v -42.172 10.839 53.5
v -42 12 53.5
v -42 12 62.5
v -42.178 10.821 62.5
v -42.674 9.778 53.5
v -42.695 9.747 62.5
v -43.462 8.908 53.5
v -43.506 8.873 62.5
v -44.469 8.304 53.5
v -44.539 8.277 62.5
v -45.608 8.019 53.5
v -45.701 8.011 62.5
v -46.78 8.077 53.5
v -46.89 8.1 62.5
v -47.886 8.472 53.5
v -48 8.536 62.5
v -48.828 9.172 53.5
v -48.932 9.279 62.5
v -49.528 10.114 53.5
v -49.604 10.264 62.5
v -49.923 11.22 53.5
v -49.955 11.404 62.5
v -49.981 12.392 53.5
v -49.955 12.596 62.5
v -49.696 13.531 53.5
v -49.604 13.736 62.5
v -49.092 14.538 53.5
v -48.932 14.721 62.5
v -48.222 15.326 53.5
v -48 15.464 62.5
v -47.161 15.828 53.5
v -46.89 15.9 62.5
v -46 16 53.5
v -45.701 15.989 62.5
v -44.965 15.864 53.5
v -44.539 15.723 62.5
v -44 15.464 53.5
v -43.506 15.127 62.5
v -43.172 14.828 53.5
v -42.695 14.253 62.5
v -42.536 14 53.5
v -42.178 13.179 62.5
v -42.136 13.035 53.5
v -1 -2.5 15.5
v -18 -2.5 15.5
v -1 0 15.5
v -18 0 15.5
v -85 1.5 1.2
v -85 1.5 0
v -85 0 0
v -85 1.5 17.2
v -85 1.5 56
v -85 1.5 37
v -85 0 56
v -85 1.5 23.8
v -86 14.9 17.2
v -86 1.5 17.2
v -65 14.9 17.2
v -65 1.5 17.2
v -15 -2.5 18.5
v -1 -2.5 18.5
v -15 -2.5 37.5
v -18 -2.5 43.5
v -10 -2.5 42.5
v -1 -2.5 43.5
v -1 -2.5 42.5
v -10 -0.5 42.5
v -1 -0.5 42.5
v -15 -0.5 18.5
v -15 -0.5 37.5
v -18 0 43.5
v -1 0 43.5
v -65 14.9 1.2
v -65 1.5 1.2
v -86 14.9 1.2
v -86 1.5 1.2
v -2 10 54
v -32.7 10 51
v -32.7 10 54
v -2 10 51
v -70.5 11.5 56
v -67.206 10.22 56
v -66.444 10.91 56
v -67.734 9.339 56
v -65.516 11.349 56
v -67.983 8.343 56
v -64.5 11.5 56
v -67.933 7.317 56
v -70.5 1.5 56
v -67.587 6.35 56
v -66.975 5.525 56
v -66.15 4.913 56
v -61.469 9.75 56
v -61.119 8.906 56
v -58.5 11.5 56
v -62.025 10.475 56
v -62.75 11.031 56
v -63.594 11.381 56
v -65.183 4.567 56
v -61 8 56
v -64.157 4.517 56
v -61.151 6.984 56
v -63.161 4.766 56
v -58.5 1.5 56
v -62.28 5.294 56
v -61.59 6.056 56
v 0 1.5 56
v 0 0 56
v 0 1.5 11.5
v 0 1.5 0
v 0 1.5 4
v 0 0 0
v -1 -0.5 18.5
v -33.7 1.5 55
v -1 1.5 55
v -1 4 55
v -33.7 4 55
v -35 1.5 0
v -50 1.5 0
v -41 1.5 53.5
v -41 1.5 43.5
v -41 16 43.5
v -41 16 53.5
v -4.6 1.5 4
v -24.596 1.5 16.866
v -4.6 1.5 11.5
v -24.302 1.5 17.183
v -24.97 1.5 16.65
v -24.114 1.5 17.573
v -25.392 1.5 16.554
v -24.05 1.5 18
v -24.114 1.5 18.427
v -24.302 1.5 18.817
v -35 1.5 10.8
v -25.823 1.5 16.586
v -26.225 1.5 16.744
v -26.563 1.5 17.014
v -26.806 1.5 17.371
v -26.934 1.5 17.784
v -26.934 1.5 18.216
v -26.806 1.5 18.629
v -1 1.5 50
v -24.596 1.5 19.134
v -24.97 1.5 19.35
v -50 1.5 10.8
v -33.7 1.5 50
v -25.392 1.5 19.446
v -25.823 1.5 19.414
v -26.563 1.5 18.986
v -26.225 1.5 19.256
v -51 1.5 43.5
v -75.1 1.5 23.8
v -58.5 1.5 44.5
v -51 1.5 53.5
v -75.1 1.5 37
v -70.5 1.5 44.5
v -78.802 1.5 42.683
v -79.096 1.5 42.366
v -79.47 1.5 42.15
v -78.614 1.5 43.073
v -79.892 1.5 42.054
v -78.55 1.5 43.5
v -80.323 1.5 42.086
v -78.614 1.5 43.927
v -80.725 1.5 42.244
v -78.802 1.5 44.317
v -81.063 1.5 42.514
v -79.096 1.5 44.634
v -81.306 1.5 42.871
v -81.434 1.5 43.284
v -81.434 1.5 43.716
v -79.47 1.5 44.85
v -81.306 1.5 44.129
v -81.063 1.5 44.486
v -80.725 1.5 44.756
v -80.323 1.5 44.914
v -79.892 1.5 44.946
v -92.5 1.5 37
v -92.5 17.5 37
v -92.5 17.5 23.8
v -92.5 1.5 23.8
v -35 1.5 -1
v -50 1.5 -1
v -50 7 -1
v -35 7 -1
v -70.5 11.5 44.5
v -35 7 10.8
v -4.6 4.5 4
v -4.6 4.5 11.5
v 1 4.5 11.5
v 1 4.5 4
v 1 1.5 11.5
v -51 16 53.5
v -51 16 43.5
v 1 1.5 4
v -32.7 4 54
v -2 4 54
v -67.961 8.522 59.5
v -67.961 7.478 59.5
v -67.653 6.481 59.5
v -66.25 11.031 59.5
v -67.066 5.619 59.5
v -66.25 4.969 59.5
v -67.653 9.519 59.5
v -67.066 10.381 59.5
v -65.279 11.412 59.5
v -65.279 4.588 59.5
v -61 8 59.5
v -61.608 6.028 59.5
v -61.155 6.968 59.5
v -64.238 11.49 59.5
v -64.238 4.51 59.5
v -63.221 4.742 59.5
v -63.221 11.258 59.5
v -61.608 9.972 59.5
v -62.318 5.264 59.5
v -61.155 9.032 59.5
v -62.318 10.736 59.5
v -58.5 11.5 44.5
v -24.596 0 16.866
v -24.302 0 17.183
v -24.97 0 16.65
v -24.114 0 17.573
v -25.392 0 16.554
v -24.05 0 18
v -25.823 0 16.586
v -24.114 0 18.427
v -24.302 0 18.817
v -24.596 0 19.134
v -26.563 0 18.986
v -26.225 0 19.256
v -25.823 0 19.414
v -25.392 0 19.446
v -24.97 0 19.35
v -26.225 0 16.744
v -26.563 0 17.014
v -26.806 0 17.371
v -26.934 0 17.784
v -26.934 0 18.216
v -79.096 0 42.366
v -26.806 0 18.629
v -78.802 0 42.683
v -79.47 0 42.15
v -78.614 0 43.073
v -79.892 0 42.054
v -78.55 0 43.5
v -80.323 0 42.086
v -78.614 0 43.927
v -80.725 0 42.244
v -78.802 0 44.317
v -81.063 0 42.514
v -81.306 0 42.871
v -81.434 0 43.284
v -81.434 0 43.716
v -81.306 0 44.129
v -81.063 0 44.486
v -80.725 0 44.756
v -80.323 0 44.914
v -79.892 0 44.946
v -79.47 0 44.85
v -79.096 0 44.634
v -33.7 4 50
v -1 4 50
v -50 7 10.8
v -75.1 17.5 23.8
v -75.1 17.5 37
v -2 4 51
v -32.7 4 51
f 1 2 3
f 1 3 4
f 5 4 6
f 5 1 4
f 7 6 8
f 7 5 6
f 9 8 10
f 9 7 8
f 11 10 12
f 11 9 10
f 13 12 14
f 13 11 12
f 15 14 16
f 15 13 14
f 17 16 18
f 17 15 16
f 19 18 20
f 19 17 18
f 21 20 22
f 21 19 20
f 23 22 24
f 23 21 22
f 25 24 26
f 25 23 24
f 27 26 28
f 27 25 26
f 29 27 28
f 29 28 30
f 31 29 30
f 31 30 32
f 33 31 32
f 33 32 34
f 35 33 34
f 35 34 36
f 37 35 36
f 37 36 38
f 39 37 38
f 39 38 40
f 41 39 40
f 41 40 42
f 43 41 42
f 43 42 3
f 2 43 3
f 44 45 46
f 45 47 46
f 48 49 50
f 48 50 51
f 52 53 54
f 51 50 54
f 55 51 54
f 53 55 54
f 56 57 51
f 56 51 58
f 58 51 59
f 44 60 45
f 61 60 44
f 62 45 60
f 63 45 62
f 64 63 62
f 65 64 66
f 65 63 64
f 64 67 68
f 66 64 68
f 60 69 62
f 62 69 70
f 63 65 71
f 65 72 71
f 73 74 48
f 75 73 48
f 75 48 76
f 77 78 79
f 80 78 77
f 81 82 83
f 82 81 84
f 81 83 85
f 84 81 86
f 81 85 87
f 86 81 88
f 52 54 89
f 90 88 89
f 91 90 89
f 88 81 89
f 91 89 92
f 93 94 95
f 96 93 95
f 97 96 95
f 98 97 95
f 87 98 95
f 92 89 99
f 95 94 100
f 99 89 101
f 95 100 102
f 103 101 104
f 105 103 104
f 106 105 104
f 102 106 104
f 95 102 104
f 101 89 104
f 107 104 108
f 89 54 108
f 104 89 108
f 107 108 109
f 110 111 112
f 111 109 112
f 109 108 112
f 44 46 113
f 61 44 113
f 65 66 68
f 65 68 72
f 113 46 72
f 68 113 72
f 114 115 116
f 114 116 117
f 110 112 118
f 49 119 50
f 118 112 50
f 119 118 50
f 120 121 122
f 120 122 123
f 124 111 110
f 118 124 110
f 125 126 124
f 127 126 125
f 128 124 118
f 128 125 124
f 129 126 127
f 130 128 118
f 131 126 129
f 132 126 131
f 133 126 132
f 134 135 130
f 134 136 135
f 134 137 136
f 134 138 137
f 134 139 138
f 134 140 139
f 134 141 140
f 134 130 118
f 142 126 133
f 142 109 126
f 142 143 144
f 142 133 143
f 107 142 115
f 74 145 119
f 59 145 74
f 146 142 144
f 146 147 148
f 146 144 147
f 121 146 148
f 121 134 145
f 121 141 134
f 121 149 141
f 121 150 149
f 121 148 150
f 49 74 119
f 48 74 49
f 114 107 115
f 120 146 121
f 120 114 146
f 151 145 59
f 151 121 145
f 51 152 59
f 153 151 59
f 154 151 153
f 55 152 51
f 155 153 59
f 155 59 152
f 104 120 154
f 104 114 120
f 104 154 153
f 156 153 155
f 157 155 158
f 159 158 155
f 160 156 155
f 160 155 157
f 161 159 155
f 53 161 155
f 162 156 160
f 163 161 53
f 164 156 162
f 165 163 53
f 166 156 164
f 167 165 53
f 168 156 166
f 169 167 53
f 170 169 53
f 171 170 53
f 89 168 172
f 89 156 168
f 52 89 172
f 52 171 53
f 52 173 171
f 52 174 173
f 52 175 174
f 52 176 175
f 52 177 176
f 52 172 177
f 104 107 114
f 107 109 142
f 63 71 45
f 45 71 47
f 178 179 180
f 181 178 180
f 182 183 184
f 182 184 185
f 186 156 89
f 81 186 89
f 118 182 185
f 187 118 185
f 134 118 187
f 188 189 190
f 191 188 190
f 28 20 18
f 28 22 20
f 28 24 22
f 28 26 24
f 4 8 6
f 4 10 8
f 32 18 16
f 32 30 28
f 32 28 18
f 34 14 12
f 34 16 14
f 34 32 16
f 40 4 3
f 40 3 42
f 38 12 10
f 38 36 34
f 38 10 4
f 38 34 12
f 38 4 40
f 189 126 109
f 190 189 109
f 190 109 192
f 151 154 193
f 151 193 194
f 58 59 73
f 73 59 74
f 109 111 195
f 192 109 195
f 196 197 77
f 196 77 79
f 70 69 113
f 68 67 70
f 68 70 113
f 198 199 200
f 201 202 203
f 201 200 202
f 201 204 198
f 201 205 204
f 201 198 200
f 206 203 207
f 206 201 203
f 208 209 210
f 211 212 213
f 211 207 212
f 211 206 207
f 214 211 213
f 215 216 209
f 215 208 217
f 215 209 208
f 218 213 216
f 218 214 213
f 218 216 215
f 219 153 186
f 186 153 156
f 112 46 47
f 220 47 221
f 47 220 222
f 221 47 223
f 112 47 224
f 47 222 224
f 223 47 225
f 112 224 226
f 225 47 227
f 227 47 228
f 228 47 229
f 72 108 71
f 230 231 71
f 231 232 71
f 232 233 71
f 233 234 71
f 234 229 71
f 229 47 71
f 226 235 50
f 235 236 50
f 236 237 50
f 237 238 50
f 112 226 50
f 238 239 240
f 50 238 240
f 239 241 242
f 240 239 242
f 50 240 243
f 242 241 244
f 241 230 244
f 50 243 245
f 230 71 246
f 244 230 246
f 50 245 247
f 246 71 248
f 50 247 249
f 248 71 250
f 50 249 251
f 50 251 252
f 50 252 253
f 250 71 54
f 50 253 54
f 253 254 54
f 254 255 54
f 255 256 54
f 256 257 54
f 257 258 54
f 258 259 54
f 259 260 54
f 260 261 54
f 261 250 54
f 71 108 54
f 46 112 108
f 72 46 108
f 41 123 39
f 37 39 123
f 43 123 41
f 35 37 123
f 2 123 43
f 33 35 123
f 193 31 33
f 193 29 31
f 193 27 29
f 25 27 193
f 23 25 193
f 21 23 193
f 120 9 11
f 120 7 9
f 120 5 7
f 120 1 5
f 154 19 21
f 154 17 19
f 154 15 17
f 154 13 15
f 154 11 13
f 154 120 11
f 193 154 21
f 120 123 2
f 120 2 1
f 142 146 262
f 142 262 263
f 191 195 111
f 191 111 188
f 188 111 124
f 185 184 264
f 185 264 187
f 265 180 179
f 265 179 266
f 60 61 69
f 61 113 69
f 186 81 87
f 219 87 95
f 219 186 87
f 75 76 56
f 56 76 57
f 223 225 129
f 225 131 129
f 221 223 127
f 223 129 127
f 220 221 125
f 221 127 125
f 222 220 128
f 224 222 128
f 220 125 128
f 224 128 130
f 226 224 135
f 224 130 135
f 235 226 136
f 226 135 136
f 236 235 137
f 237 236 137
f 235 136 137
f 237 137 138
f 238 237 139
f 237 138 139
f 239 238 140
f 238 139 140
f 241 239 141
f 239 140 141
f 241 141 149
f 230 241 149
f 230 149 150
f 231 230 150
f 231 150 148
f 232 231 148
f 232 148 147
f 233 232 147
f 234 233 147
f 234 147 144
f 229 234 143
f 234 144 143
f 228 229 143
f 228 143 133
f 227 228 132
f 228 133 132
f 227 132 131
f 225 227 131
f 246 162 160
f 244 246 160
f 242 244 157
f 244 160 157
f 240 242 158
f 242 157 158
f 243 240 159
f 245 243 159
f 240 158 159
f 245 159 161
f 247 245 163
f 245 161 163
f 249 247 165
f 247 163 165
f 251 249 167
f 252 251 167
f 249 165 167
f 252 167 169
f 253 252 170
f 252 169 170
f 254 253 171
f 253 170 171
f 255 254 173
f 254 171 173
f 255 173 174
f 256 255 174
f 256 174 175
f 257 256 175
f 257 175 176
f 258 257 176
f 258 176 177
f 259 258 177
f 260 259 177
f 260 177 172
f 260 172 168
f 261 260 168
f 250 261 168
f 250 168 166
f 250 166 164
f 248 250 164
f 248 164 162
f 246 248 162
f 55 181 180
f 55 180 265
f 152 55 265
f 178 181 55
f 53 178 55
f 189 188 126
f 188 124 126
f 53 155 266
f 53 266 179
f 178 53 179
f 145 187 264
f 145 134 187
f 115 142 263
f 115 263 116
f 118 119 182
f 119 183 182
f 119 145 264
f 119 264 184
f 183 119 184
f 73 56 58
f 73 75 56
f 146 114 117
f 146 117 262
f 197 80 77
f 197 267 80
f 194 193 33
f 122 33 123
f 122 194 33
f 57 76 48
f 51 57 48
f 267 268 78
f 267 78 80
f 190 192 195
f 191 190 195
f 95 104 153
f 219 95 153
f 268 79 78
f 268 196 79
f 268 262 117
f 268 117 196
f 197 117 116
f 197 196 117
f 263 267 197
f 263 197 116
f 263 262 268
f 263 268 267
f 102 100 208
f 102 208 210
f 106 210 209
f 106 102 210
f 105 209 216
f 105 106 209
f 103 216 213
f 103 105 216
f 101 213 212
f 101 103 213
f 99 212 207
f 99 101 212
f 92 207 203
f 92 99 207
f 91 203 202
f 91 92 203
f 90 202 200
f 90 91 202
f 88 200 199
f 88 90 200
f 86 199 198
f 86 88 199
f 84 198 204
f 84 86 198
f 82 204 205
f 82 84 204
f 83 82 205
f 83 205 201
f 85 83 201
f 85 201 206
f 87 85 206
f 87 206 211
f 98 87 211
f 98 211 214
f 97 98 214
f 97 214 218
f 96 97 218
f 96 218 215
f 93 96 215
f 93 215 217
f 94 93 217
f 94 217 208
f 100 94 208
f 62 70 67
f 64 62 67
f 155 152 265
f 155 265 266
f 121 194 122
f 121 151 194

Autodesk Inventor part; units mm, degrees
ref_plane "YZ Plane" through (0, 0, 0) normal (1, 0, 0) x (0, 1, 0)
ref_plane "XZ Plane" through (0, 0, 0) normal (0, 1, 0) x (-1, 0, 0)
ref_plane "XY Plane" through (0, 0, 0) normal (0, 0, 1) x (1, 0, 0)
sketch "Skizze1" plane through (0, 0, 0) normal (0, 1, 0) x (-1, 0, 0)
  line L0 (0, 0) -> (85, 0)
  line L1 (85, 0) -> (85, 56)
  line L2 (85, 56) -> (0, 56)
  line L3 (0, 56) -> (0, 0)
  dimension "d0" = 85
  dimension "d1" = 56
extrude "Extrusion1" add sketch "Skizze1" along normal blind 1.5
sketch "Skizze2" plane through (0, 1.5, 0) normal (0, 1, 0) x (1, 0, 0)
  line L0 (0, 0) -> (-85, 0) projected
  line L1 (-86, -17.2) -> (-65, -17.2)
  line L2 (-65, -17.2) -> (-65, -1.2)
  line L3 (-65, -1.2) -> (-86, -1.2)
  line L4 (-86, -1.2) -> (-86, -17.2)
  line L5 (-85, 0) -> (-85, -56) projected
  dimension "d4" = 21
  dimension "d5" = 16
  dimension "d6" = 1.2
  dimension "d84" = 1
extrude "Extrusion2" add sketch "Skizze2" along normal blind 13.4
sketch "Skizze3" plane through (0, 1.5, 0) normal (0, 1, 0) x (1, 0, 0)
  line L0 (-65, -17.2) -> (-85, -17.2) projected
  line L1 (-85, -17.2) -> (-85, -56) projected
  line L2 (-92.5, -23.8) -> (-75.1, -23.8)
  line L3 (-75.1, -23.8) -> (-75.1, -37)
  line L4 (-75.1, -37) -> (-92.5, -37)
  line L5 (-92.5, -37) -> (-92.5, -23.8)
  dimension "d9" = 7.5
  dimension "d10" = 17.4
  dimension "d11" = 13.2
  dimension "d12" = 6.6
extrude "Extrusion3" add sketch "Skizze3" along normal blind 16
sketch "Skizze4" plane through (0, 1.5, 0) normal (0, 1, 0) x (1, 0, 0)
  line L0 (0, 0) -> (-85, 0) projected
  line L1 (-65, -1.2) -> (-65, -17.2) projected
  line L2 (-50, 1) -> (-35, 1)
  line L3 (-35, 1) -> (-35, -10.8)
  line L4 (-35, -10.8) -> (-50, -10.8)
  line L5 (-50, -10.8) -> (-50, 1)
  dimension "d15" = 1
  dimension "d16" = 15
  dimension "d17" = 11.8
  dimension "d18" = 15
extrude "Extrusion4" add sketch "Skizze4" along normal blind 5.5
sketch "Skizze5" plane through (0, 1.5, 0) normal (0, 1, 0) x (1, 0, 0)
  line L0 (-85, -37) -> (-85, -56) projected
  line L1 (-85, -56) -> (0, -56) projected
  line L2 (-58.5, -44.5) -> (-70.5, -44.5)
  line L3 (-70.5, -44.5) -> (-70.5, -56)
  line L4 (-70.5, -56) -> (-58.5, -56)
  line L5 (-58.5, -56) -> (-58.5, -44.5)
  line L6 (-70.5, -56) -> (-58.5, -56)
  dimension "d21" = 11.5
  dimension "d22" = 12
  dimension "d23" = 14.5
extrude "Extrusion5" add sketch "Skizze5" along normal blind 10
sketch "Skizze6" plane through (-85, 0, 56) normal (0, 0, 1) x (1, 0, 0)
  line L0 (14.5, 11.5) -> (26.5, 11.5) projected
  circle A0 centre (20.5, 8) radius 3.5
  dimension "d26" = 7
  dimension "d27" = 3.5
extrude "Extrusion6" add sketch "Skizze6" along normal blind 3.5
sketch "Skizze7" plane through (0, 1.5, 0) normal (0, 1, 0) x (1, 0, 0)
  line L0 (-58.5, -44.5) -> (-58.5, -56) projected
  line L1 (-58.5, -56) -> (0, -56) projected
  line L2 (-51, -43.5) -> (-41, -43.5)
  line L3 (-41, -43.5) -> (-41, -53.5)
  line L4 (-41, -53.5) -> (-51, -53.5)
  line L5 (-51, -53.5) -> (-51, -43.5)
  dimension "d30" = 10
  dimension "d31" = 10
  dimension "d32" = 2.5
  dimension "d33" = 7.5
extrude "Extrusion7" add sketch "Skizze7" along normal blind 14.5
sketch "Skizze8" plane through (-51, 1.5, 53.5) normal (0, 0, 1) x (1, 0, 0)
  line L0 (0, 14.5) -> (10, 14.5) projected
  circle A0 centre (5, 10.5) radius 4
  point P0 (51, -1.5)
  dimension "d36" = 8
  dimension "d37" = 0
extrude "Extrusion8" add sketch "Skizze8" along normal blind 9
sketch "Skizze9" plane through (0, 1.5, 0) normal (0, 1, 0) x (1, 0, 0)
  line L0 (-58.5, -56) -> (0, -56) projected
  line L1 (0, -56) -> (0, 0) projected
  line L2 (-1, -55) -> (-33.7, -55)
  line L3 (-33.7, -55) -> (-33.7, -50)
  line L4 (-33.7, -50) -> (-1, -50)
  line L5 (-1, -50) -> (-1, -55)
  dimension "d40" = 32.7
  dimension "d41" = 5
  dimension "d42" = 1
  dimension "d43" = 1
extrude "Extrusion9" add sketch "Skizze9" along normal blind 2.5
sketch "Skizze10" plane through (0, 4, 0) normal (0, 1, 0) x (1, 0, 0)
  line L0 (-33.7, -55) -> (-1, -55) projected
  line L1 (-1, -55) -> (-1, -50) projected
  line L2 (-1, -50) -> (-33.7, -50) projected
  line L3 (-33.7, -50) -> (-33.7, -55) projected
  line L4 (-32.7, -51) -> (-2, -51)
  line L5 (-2, -51) -> (-2, -54)
  line L6 (-2, -54) -> (-32.7, -54)
  line L7 (-32.7, -54) -> (-32.7, -51)
  point P0 (0, 0)
  dimension "d50" = 1
  dimension "d51" = 1
  dimension "d52" = 1
  dimension "d53" = 1
extrude "Extrusion10" add sketch "Skizze10" along normal blind 6 contours L4 L5 L6 L7
sketch "Skizze11" plane through (0, 1.5, 0) normal (0, 1, 0) x (1, 0, 0)
  line L0 (0, -56) -> (0, 0) projected
  line L1 (0, 0) -> (-35, 0) projected
  line L2 (1, -4) -> (-4.6, -4)
  line L3 (-4.6, -4) -> (-4.6, -11.5)
  line L4 (-4.6, -11.5) -> (1, -11.5)
  line L5 (1, -11.5) -> (1, -4)
  dimension "d56" = 1
  dimension "d57" = 7.5
  dimension "d58" = 5.6
  dimension "d59" = 4
extrude "Extrusion11" add sketch "Skizze11" along normal blind 3
sketch "Skizze12" plane through (0, 0, 0) normal (0, -1, 0) x (1, 0, 0)
  line L0 (0, 0) -> (-85, 0) projected
  line L1 (0, 56) -> (0, 0) projected
  line L2 (-1, 43.5) -> (-18, 43.5)
  line L3 (-18, 43.5) -> (-18, 15.5)
  line L4 (-18, 15.5) -> (-1, 15.5)
  line L5 (-1, 15.5) -> (-1, 43.5)
  dimension "d62" = 15.5
  dimension "d63" = 17
  dimension "d64" = 28
  dimension "d65" = 1
extrude "Extrusion12" add sketch "Skizze12" along normal blind 0.5
sketch "Skizze13" plane through (0, -0.5, 0) normal (0, -1, 0) x (1, 0, 0)
  line L0 (-1, 43.5) -> (-18, 43.5) projected
  line L1 (-18, 43.5) -> (-18, 15.5) projected
  line L2 (-18, 15.5) -> (-1, 15.5) projected
  line L3 (-1, 15.5) -> (-1, 43.5) projected
  line L4 (-15, 42.5) -> (-1, 42.5)
  line L5 (-1, 42.5) -> (-1, 18.5)
  line L6 (-1, 18.5) -> (-15, 18.5)
  line L7 (-15, 18.5) -> (-15, 42.5)
  line L8 (-15, 37.5) -> (-10, 42.5)
  line L9 (-15, 37.5) -> (-7.9289, 37.5) construction
  point P0 (0, 0)
  dimension "d69" = 24
  dimension "d70" = 3
  dimension "d71" = 3
  dimension "d72" = 45
  dimension "d73" = 19
extrude "Extrusion13" add sketch "Skizze13" along normal blind 2 contours L3 L4 L7 L6 L2 L1 L0 | L8 L7 L4
sketch "Skizze14" plane through (0, 1.5, 0) normal (0, 1, 0) x (1, 0, 0)
  line L0 (0, 0) -> (-35, 0) projected
  line L1 (-85, -37) -> (-85, -56) projected
  line L2 (-85, -56) -> (-70.5, -56) projected
  line L3 (0, -56) -> (0, -11.5) projected
  circle A0 centre (-25.5, -18) radius 1.45
  circle A1 centre (-80, -43.5) radius 1.45
  dimension "d76" = 2.9
  dimension "d77" = 25.5
  dimension "d78" = 18
  dimension "d79" = 2.9
  dimension "d80" = 5
  dimension "d81" = 12.5
extrude "Extrusion14" cut sketch "Skizze14" against normal through all
properties part number "PCB"
